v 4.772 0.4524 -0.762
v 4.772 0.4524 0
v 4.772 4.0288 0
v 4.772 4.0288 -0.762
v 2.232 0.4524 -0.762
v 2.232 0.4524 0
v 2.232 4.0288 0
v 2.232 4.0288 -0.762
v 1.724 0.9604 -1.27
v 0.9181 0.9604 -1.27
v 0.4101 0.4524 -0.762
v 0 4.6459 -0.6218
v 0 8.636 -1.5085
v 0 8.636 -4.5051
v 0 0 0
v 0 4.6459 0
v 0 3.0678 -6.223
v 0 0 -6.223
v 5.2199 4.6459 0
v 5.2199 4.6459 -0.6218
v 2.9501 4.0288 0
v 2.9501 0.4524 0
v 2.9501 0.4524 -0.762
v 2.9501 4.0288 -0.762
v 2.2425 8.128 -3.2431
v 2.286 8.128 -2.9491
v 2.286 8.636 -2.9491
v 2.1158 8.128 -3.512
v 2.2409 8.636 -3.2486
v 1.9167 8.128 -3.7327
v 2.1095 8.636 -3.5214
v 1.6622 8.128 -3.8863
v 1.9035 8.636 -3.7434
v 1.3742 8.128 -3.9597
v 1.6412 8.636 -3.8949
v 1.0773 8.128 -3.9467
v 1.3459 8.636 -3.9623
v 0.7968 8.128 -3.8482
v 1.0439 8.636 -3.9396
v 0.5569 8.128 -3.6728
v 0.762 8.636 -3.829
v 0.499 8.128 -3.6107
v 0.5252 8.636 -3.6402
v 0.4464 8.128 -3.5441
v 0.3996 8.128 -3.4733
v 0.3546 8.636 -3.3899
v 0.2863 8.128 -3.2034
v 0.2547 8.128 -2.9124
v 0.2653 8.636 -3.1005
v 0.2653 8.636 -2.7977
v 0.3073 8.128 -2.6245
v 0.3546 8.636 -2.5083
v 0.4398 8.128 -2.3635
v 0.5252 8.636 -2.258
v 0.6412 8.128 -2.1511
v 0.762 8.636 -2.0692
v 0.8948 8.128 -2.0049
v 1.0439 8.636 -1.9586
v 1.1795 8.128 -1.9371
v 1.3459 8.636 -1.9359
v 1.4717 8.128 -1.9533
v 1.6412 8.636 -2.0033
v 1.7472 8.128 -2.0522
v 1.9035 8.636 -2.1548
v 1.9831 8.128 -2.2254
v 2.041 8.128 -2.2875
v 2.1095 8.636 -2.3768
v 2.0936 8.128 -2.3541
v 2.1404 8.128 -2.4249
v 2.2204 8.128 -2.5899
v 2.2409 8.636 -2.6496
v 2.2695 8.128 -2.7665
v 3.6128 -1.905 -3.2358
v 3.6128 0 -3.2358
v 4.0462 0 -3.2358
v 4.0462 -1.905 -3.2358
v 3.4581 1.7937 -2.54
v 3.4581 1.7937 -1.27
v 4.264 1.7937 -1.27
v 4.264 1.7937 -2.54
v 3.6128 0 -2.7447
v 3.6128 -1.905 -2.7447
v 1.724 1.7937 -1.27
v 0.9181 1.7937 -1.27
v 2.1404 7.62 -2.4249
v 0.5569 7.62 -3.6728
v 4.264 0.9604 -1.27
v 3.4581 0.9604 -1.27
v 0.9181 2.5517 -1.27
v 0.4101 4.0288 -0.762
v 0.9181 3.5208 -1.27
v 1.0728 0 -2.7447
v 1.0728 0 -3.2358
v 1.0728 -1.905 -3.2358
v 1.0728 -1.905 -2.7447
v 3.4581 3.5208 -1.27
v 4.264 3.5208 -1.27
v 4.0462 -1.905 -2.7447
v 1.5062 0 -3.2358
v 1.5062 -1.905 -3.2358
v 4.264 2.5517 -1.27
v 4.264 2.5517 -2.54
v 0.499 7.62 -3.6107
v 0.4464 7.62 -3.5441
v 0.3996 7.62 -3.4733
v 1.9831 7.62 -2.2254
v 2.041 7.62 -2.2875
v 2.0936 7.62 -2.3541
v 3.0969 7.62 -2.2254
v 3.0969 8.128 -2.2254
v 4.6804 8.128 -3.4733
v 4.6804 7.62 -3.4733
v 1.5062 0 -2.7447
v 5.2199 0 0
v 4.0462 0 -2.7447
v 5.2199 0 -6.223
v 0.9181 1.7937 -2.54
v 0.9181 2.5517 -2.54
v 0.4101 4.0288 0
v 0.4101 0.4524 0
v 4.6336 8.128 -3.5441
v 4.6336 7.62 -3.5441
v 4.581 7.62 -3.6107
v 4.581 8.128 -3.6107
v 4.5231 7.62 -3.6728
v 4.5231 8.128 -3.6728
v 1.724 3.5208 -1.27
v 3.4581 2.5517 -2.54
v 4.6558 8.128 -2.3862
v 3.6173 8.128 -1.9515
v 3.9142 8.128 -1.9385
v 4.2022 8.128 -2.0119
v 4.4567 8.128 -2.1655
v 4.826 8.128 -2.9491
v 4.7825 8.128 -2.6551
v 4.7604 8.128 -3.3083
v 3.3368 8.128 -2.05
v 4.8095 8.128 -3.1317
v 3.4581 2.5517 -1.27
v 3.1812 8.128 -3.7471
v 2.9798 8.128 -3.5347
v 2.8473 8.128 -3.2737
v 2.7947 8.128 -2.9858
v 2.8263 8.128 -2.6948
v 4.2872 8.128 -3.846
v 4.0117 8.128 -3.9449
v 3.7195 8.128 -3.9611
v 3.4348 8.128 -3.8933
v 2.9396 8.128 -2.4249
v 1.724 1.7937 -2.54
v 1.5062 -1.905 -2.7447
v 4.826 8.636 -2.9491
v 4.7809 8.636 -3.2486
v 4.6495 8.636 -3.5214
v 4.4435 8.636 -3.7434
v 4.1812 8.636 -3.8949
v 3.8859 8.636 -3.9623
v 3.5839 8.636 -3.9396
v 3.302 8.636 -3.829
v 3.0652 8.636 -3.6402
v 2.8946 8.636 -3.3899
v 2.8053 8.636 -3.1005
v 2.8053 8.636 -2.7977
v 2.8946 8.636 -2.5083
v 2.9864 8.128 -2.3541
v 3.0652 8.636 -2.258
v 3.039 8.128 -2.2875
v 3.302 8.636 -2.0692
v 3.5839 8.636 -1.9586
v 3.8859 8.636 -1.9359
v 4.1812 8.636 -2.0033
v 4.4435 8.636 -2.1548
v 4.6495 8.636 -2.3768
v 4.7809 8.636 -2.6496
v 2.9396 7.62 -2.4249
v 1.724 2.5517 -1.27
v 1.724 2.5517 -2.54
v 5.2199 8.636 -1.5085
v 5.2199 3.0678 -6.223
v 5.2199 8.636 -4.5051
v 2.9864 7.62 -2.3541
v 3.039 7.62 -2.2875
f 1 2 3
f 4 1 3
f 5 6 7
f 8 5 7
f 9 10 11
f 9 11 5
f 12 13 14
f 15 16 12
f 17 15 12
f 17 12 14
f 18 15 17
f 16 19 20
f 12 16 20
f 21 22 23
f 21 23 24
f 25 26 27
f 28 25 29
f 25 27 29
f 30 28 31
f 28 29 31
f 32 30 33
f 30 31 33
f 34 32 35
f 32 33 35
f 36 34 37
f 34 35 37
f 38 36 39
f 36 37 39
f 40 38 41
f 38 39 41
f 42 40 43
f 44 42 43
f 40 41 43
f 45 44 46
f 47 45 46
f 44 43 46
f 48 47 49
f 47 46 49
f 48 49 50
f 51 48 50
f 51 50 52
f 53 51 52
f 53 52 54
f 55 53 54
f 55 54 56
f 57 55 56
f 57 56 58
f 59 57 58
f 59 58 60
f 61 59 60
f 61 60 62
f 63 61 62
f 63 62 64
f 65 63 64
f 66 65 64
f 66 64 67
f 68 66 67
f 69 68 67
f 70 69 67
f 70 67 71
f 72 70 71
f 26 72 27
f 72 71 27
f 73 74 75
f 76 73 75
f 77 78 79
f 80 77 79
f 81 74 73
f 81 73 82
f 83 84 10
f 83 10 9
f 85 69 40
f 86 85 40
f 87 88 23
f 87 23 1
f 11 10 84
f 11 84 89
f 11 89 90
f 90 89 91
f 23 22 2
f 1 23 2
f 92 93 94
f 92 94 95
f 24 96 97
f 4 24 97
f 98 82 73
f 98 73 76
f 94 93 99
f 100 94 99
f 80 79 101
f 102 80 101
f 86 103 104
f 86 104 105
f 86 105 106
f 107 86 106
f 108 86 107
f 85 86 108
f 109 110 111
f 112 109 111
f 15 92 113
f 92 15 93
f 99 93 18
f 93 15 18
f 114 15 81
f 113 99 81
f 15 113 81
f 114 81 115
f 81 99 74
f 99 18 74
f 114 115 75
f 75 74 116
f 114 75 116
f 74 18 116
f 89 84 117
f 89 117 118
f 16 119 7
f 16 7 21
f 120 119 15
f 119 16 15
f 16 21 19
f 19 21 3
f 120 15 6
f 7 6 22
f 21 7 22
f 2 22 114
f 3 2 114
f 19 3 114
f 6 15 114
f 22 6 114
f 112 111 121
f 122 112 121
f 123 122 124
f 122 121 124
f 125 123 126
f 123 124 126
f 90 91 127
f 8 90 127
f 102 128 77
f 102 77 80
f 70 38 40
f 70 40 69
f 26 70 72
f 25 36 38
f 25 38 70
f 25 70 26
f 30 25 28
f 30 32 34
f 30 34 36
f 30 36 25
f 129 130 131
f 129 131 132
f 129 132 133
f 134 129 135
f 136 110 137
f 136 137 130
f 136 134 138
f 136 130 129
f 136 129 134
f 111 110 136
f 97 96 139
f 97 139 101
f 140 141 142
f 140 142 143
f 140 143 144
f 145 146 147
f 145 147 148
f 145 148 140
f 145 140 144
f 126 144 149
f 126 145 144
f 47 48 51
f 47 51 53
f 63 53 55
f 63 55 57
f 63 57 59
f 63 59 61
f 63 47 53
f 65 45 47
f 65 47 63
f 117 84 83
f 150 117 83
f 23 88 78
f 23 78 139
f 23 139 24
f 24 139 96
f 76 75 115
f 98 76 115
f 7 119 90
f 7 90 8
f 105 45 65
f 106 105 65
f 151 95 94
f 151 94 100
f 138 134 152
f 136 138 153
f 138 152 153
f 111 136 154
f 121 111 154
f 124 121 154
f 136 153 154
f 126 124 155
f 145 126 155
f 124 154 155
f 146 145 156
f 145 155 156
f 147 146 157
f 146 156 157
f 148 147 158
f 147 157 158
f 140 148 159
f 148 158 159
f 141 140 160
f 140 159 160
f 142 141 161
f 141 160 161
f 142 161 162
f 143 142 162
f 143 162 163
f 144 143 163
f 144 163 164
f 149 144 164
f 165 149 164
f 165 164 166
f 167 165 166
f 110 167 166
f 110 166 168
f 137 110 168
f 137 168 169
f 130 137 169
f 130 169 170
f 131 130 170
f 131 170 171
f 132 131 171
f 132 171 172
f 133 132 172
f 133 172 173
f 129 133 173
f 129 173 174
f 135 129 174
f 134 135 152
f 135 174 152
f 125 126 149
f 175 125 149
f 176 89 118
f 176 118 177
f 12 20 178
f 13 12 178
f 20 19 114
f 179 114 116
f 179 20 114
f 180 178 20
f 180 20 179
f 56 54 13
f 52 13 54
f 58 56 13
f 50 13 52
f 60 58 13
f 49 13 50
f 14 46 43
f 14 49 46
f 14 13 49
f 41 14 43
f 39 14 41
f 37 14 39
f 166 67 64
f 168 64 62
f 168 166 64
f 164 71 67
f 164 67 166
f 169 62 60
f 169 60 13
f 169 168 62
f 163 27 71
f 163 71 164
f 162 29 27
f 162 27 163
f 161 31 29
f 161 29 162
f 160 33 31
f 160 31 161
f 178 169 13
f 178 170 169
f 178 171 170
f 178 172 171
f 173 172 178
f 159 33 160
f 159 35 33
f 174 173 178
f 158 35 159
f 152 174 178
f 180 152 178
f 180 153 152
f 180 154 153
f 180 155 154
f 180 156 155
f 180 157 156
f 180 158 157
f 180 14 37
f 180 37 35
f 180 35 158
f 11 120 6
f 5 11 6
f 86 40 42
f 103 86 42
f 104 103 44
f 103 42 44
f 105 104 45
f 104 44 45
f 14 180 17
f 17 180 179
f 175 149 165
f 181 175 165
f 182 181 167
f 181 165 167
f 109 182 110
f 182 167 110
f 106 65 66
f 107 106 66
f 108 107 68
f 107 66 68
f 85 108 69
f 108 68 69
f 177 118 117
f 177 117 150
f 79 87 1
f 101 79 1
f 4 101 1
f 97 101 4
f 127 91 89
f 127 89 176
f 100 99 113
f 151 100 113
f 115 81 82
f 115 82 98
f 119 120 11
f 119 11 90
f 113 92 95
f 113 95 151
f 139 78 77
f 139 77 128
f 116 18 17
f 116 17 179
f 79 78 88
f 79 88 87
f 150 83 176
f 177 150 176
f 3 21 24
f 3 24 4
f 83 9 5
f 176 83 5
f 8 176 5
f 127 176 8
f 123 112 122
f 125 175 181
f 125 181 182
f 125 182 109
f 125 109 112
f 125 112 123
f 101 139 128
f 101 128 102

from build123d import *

# Parameters (mm, degrees)
SKETCH1_W          = 20.701
SKETCH1_H          = 6.223
EXTRUDE1_DEPTH     = 8.636
CUT_EXTRUDE1_DEPTH = 25.4
CUT_EXTRUDE2_DEPTH = 25.4
SKETCH4_R          = 1.016
CUT_EXTRUDE3_DEPTH = 0.508
CUT_EXTRUDE4_DEPTH = 0.508
SKETCH6_W          = 1.82195604
SKETCH6_H          = 3.576432228
CUT_EXTRUDE5_DEPTH = 1.27
CHAMFER1_SIZE      = 0.508
SKETCH7_W          = 0.80595604
SKETCH7_H          = 0.757943843
CUT_EXTRUDE6_DEPTH = 1.27
SKETCH8_W          = 0.433382436
SKETCH8_H          = 0.491166761
EXTRUDE2_DEPTH     = 1.905
SKETCH9_W          = 13.835725518
SKETCH9_H          = 11.068580414
CUT_EXTRUDE7_DEPTH = 25.4
SKETCH10_W         = 3.388588983
SKETCH10_H         = 10.514703946
CUT_EXTRUDE8_DEPTH = 25.4


with BuildPart() as part:
    # Sketch1 → Extrude1 (new body)
    with BuildSketch(Plane(origin=(0, 0, 0), x_dir=(1, 0, 0), z_dir=(0, 1, 0))):
        with Locations((10.3505, 3.1115)):
            Rectangle(SKETCH1_W, SKETCH1_H)
    extrude(amount=EXTRUDE1_DEPTH)

    # Sketch2 → Cut-Extrude1 (cut)
    with BuildSketch(Plane(origin=(20.701, 0, 0), x_dir=(0, 0, -1), z_dir=(1, 0, 0))):
        Polygon((-2.869110069, 4.645946632), (0.62179162, 4.645946632), (2.217632392, 11.827230107), (-2.869110069, 11.827230107), align=None)
    extrude(amount=-CUT_EXTRUDE1_DEPTH, mode=Mode.SUBTRACT)

    # Sketch3 → Cut-Extrude2 (cut)
    with BuildSketch(Plane(origin=(20.701, 0, 0), x_dir=(0, 0, -1), z_dir=(1, 0, 0))):
        Polygon((4.012953261, 10.231389335), (6.905414661, 0.855824797), (9.199435771, 0.855824797), (9.199435771, 10.231389335), align=None)
    extrude(amount=-CUT_EXTRUDE2_DEPTH, mode=Mode.SUBTRACT)

    # Sketch4 → Cut-Extrude3 (cut)
    with BuildSketch(Plane(origin=(0, 8.636, 0), x_dir=(1, 0, 0), z_dir=(0, 1, 0))):
        with Locations((1.27, 2.949100672)):
            Circle(SKETCH4_R)
        with Locations((3.81, 2.949100672)):
            Circle(SKETCH4_R)
        with Locations((6.35, 2.949100672)):
            Circle(SKETCH4_R)
        with Locations((8.89, 2.949100672)):
            Circle(SKETCH4_R)
        with Locations((11.43, 2.949100672)):
            Circle(SKETCH4_R)
        with Locations((13.97, 2.949100672)):
            Circle(SKETCH4_R)
        with Locations((16.51, 2.949100672)):
            Circle(SKETCH4_R)
        with Locations((19.05, 2.949100672)):
            Circle(SKETCH4_R)
    extrude(amount=-CUT_EXTRUDE3_DEPTH, mode=Mode.SUBTRACT)

    # Sketch5 → Cut-Extrude4 (cut)
    with BuildSketch(Plane(origin=(0, 8.128, 0), x_dir=(1, 0, 0), z_dir=(0, 1, 0))):
        with BuildLine():
            ThreePointArc((0.55685802, 3.67276117), (0.471993814, 3.577942566), (0.399647546, 3.473259623))
            Line((0.399647546, 3.473259623), (1.98314198, 2.225440174))
            ThreePointArc((1.98314198, 2.225440174), (2.068006186, 2.320258778), (2.140352454, 2.42494172))
            Line((2.140352454, 2.42494172), (0.55685802, 3.67276117))
        make_face()
        with BuildLine():
            ThreePointArc((2.939647546, 2.42494172), (3.011993814, 2.320258778), (3.09685802, 2.225440174))
            Line((3.09685802, 2.225440174), (4.680352454, 3.473259623))
            ThreePointArc((4.680352454, 3.473259623), (4.608006186, 3.577942566), (4.52314198, 3.67276117))
            Line((4.52314198, 3.67276117), (2.939647546, 2.42494172))
        make_face()
        with BuildLine():
            ThreePointArc((5.34196875, 3.076100672), (5.334, 2.949100672), (5.34196875, 2.822100672))
            Line((5.34196875, 2.822100672), (7.35803125, 2.822100672))
            ThreePointArc((7.35803125, 2.822100672), (7.364005855, 2.885475793), (7.366, 2.949100672))
            ThreePointArc((7.366, 2.949100672), (7.364005855, 3.012725551), (7.35803125, 3.076100672))
            Line((7.35803125, 3.076100672), (5.34196875, 3.076100672))
        make_face()
        with BuildLine():
            ThreePointArc((8.458529789, 2.041483422), (8.576688012, 1.994233554), (8.699870069, 1.9622946))
            Line((8.699870069, 1.9622946), (9.321470211, 3.856717921))
            ThreePointArc((9.321470211, 3.856717921), (9.203311988, 3.90396779), (9.080129931, 3.935906744))
            Line((9.080129931, 3.935906744), (8.458529789, 2.041483422))
        make_face()
        with BuildLine():
            ThreePointArc((11.557, 3.957131921), (11.43, 3.965100672), (11.303, 3.957131921))
            Line((11.303, 3.957131921), (11.303, 1.941069422))
            ThreePointArc((11.303, 1.941069422), (11.43, 1.933100672), (11.557, 1.941069422))
            Line((11.557, 1.941069422), (11.557, 3.957131921))
        make_face()
        with BuildLine():
            ThreePointArc((13.060727808, 3.402399778), (13.011197076, 3.285185412), (12.976706622, 3.162699047))
            Line((12.976706622, 3.162699047), (14.879272192, 2.495801565))
            ThreePointArc((14.879272192, 2.495801565), (14.928802924, 2.613015931), (14.963293378, 2.735502296))
            Line((14.963293378, 2.735502296), (13.060727808, 3.402399778))
        make_face()
        with BuildLine():
            ThreePointArc((16.944941036, 3.867295801), (16.826755289, 3.914461789), (16.703600756, 3.946484624))
            Line((16.703600756, 3.946484624), (16.075058964, 2.030905542))
            ThreePointArc((16.075058964, 2.030905542), (16.193244711, 1.983739555), (16.316399244, 1.95171672))
            Line((16.316399244, 1.95171672), (16.944941036, 3.867295801))
        make_face()
        with BuildLine():
            ThreePointArc((18.349819557, 3.662547267), (18.264852019, 3.567810091), (18.192609083, 3.463045721))
            Line((18.192609083, 3.463045721), (19.750180443, 2.235654077))
            ThreePointArc((19.750180443, 2.235654077), (19.835147981, 2.330391253), (19.907390917, 2.435155623))
            Line((19.907390917, 2.435155623), (18.349819557, 3.662547267))
        make_face()
    extrude(amount=-CUT_EXTRUDE4_DEPTH, mode=Mode.SUBTRACT)

    # Sketch6 → Cut-Extrude5 (cut)
    with BuildSketch(Plane.XY):
        with Locations((3.861070401, 2.24061075)):
            Rectangle(SKETCH6_W, SKETCH6_H)
        with Locations((1.321070401, 2.24061075)):
            Rectangle(SKETCH6_W, SKETCH6_H)
        with Locations((6.401070401, 2.24061075)):
            Rectangle(SKETCH6_W, SKETCH6_H)
        with Locations((8.941070401, 2.24061075)):
            Rectangle(SKETCH6_W, SKETCH6_H)
        with Locations((11.481070401, 2.24061075)):
            Rectangle(SKETCH6_W, SKETCH6_H)
        with Locations((14.021070401, 2.24061075)):
            Rectangle(SKETCH6_W, SKETCH6_H)
        with Locations((16.561070401, 2.24061075)):
            Rectangle(SKETCH6_W, SKETCH6_H)
        with Locations((19.101070401, 2.24061075)):
            Rectangle(SKETCH6_W, SKETCH6_H)
    extrude(amount=-CUT_EXTRUDE5_DEPTH, mode=Mode.SUBTRACT)

    # Chamfer1
    chamfer1_edges = [part.edges().sort_by_distance(p)[0] for p in [
        (0.410092381, 2.24061075, -1.27),
        (1.321070401, 4.028826864, -1.27),
        (2.232048421, 2.24061075, -1.27),
        (1.321070401, 0.452394636, -1.27),
        (3.861070401, 4.028826864, -1.27),
        (4.772048421, 2.24061075, -1.27),
        (3.861070401, 0.452394636, -1.27),
        (2.950092381, 2.24061075, -1.27),
        (6.401070401, 4.028826864, -1.27),
        (7.312048421, 2.24061075, -1.27),
        (6.401070401, 0.452394636, -1.27),
        (5.490092381, 2.24061075, -1.27),
        (8.941070401, 4.028826864, -1.27),
        (9.852048421, 2.24061075, -1.27),
        (8.941070401, 0.452394636, -1.27),
        (8.030092381, 2.24061075, -1.27),
        (11.481070401, 4.028826864, -1.27),
        (12.392048421, 2.24061075, -1.27),
        (11.481070401, 0.452394636, -1.27),
        (10.570092381, 2.24061075, -1.27),
        (14.021070401, 4.028826864, -1.27),
        (14.932048421, 2.24061075, -1.27),
        (14.021070401, 0.452394636, -1.27),
        (13.110092381, 2.24061075, -1.27),
        (16.561070401, 4.028826864, -1.27),
        (17.472048421, 2.24061075, -1.27),
        (16.561070401, 0.452394636, -1.27),
        (15.650092381, 2.24061075, -1.27),
        (19.101070401, 4.028826864, -1.27),
        (20.012048421, 2.24061075, -1.27),
        (19.101070401, 0.452394636, -1.27),
        (18.190092381, 2.24061075, -1.27),
    ]]
    chamfer(chamfer1_edges, length=CHAMFER1_SIZE)

    # Sketch7 → Cut-Extrude6 (cut)
    with BuildSketch(Plane.XY.offset(-1.27)):
        with Locations((1.321070401, 2.17271271)):
            Rectangle(SKETCH7_W, SKETCH7_H)
        with Locations((3.861070401, 2.17271271)):
            Rectangle(SKETCH7_W, SKETCH7_H)
        with Locations((6.401070401, 2.17271271)):
            Rectangle(SKETCH7_W, SKETCH7_H)
        with Locations((8.941070401, 2.17271271)):
            Rectangle(SKETCH7_W, SKETCH7_H)
        with Locations((11.481070401, 2.17271271)):
            Rectangle(SKETCH7_W, SKETCH7_H)
        with Locations((14.021070401, 2.17271271)):
            Rectangle(SKETCH7_W, SKETCH7_H)
        with Locations((16.561070401, 2.17271271)):
            Rectangle(SKETCH7_W, SKETCH7_H)
        with Locations((19.101070401, 2.17271271)):
            Rectangle(SKETCH7_W, SKETCH7_H)
    extrude(amount=-CUT_EXTRUDE6_DEPTH, mode=Mode.SUBTRACT)

    # Sketch8 → Extrude2 (add)
    with BuildSketch(Plane.XZ):
        with Locations((3.829530977, -2.990246105)):
            Rectangle(SKETCH8_W, SKETCH8_H)
        with Locations((1.289530977, -2.990246105)):
            Rectangle(SKETCH8_W, SKETCH8_H)
        with Locations((6.369530977, -2.990246105)):
            Rectangle(SKETCH8_W, SKETCH8_H)
        with Locations((8.909530977, -2.990246105)):
            Rectangle(SKETCH8_W, SKETCH8_H)
        with Locations((11.449530977, -2.990246105)):
            Rectangle(SKETCH8_W, SKETCH8_H)
        with Locations((13.989530977, -2.990246105)):
            Rectangle(SKETCH8_W, SKETCH8_H)
        with Locations((16.529530977, -2.990246105)):
            Rectangle(SKETCH8_W, SKETCH8_H)
        with Locations((19.069530977, -2.990246105)):
            Rectangle(SKETCH8_W, SKETCH8_H)
    extrude(amount=EXTRUDE2_DEPTH)

    # Sketch9 → Cut-Extrude7 (cut)
    with BuildSketch(Plane(origin=(0, 8.636, 0), x_dir=(1, 0, 0), z_dir=(0, 1, 0))):
        with Locations((14.474610491, 2.472928053)):
            Rectangle(SKETCH9_W, SKETCH9_H)
    extrude(amount=-CUT_EXTRUDE7_DEPTH, mode=Mode.SUBTRACT)

    # Sketch10 → Cut-Extrude8 (cut)
    with BuildSketch(Plane(origin=(0, 8.636, 0), x_dir=(1, 0, 0), z_dir=(0, 1, 0))):
        with Locations((6.914242224, 3.1115)):
            Rectangle(SKETCH10_W, SKETCH10_H)
    extrude(amount=-CUT_EXTRUDE8_DEPTH, mode=Mode.SUBTRACT)


solid = part.part
